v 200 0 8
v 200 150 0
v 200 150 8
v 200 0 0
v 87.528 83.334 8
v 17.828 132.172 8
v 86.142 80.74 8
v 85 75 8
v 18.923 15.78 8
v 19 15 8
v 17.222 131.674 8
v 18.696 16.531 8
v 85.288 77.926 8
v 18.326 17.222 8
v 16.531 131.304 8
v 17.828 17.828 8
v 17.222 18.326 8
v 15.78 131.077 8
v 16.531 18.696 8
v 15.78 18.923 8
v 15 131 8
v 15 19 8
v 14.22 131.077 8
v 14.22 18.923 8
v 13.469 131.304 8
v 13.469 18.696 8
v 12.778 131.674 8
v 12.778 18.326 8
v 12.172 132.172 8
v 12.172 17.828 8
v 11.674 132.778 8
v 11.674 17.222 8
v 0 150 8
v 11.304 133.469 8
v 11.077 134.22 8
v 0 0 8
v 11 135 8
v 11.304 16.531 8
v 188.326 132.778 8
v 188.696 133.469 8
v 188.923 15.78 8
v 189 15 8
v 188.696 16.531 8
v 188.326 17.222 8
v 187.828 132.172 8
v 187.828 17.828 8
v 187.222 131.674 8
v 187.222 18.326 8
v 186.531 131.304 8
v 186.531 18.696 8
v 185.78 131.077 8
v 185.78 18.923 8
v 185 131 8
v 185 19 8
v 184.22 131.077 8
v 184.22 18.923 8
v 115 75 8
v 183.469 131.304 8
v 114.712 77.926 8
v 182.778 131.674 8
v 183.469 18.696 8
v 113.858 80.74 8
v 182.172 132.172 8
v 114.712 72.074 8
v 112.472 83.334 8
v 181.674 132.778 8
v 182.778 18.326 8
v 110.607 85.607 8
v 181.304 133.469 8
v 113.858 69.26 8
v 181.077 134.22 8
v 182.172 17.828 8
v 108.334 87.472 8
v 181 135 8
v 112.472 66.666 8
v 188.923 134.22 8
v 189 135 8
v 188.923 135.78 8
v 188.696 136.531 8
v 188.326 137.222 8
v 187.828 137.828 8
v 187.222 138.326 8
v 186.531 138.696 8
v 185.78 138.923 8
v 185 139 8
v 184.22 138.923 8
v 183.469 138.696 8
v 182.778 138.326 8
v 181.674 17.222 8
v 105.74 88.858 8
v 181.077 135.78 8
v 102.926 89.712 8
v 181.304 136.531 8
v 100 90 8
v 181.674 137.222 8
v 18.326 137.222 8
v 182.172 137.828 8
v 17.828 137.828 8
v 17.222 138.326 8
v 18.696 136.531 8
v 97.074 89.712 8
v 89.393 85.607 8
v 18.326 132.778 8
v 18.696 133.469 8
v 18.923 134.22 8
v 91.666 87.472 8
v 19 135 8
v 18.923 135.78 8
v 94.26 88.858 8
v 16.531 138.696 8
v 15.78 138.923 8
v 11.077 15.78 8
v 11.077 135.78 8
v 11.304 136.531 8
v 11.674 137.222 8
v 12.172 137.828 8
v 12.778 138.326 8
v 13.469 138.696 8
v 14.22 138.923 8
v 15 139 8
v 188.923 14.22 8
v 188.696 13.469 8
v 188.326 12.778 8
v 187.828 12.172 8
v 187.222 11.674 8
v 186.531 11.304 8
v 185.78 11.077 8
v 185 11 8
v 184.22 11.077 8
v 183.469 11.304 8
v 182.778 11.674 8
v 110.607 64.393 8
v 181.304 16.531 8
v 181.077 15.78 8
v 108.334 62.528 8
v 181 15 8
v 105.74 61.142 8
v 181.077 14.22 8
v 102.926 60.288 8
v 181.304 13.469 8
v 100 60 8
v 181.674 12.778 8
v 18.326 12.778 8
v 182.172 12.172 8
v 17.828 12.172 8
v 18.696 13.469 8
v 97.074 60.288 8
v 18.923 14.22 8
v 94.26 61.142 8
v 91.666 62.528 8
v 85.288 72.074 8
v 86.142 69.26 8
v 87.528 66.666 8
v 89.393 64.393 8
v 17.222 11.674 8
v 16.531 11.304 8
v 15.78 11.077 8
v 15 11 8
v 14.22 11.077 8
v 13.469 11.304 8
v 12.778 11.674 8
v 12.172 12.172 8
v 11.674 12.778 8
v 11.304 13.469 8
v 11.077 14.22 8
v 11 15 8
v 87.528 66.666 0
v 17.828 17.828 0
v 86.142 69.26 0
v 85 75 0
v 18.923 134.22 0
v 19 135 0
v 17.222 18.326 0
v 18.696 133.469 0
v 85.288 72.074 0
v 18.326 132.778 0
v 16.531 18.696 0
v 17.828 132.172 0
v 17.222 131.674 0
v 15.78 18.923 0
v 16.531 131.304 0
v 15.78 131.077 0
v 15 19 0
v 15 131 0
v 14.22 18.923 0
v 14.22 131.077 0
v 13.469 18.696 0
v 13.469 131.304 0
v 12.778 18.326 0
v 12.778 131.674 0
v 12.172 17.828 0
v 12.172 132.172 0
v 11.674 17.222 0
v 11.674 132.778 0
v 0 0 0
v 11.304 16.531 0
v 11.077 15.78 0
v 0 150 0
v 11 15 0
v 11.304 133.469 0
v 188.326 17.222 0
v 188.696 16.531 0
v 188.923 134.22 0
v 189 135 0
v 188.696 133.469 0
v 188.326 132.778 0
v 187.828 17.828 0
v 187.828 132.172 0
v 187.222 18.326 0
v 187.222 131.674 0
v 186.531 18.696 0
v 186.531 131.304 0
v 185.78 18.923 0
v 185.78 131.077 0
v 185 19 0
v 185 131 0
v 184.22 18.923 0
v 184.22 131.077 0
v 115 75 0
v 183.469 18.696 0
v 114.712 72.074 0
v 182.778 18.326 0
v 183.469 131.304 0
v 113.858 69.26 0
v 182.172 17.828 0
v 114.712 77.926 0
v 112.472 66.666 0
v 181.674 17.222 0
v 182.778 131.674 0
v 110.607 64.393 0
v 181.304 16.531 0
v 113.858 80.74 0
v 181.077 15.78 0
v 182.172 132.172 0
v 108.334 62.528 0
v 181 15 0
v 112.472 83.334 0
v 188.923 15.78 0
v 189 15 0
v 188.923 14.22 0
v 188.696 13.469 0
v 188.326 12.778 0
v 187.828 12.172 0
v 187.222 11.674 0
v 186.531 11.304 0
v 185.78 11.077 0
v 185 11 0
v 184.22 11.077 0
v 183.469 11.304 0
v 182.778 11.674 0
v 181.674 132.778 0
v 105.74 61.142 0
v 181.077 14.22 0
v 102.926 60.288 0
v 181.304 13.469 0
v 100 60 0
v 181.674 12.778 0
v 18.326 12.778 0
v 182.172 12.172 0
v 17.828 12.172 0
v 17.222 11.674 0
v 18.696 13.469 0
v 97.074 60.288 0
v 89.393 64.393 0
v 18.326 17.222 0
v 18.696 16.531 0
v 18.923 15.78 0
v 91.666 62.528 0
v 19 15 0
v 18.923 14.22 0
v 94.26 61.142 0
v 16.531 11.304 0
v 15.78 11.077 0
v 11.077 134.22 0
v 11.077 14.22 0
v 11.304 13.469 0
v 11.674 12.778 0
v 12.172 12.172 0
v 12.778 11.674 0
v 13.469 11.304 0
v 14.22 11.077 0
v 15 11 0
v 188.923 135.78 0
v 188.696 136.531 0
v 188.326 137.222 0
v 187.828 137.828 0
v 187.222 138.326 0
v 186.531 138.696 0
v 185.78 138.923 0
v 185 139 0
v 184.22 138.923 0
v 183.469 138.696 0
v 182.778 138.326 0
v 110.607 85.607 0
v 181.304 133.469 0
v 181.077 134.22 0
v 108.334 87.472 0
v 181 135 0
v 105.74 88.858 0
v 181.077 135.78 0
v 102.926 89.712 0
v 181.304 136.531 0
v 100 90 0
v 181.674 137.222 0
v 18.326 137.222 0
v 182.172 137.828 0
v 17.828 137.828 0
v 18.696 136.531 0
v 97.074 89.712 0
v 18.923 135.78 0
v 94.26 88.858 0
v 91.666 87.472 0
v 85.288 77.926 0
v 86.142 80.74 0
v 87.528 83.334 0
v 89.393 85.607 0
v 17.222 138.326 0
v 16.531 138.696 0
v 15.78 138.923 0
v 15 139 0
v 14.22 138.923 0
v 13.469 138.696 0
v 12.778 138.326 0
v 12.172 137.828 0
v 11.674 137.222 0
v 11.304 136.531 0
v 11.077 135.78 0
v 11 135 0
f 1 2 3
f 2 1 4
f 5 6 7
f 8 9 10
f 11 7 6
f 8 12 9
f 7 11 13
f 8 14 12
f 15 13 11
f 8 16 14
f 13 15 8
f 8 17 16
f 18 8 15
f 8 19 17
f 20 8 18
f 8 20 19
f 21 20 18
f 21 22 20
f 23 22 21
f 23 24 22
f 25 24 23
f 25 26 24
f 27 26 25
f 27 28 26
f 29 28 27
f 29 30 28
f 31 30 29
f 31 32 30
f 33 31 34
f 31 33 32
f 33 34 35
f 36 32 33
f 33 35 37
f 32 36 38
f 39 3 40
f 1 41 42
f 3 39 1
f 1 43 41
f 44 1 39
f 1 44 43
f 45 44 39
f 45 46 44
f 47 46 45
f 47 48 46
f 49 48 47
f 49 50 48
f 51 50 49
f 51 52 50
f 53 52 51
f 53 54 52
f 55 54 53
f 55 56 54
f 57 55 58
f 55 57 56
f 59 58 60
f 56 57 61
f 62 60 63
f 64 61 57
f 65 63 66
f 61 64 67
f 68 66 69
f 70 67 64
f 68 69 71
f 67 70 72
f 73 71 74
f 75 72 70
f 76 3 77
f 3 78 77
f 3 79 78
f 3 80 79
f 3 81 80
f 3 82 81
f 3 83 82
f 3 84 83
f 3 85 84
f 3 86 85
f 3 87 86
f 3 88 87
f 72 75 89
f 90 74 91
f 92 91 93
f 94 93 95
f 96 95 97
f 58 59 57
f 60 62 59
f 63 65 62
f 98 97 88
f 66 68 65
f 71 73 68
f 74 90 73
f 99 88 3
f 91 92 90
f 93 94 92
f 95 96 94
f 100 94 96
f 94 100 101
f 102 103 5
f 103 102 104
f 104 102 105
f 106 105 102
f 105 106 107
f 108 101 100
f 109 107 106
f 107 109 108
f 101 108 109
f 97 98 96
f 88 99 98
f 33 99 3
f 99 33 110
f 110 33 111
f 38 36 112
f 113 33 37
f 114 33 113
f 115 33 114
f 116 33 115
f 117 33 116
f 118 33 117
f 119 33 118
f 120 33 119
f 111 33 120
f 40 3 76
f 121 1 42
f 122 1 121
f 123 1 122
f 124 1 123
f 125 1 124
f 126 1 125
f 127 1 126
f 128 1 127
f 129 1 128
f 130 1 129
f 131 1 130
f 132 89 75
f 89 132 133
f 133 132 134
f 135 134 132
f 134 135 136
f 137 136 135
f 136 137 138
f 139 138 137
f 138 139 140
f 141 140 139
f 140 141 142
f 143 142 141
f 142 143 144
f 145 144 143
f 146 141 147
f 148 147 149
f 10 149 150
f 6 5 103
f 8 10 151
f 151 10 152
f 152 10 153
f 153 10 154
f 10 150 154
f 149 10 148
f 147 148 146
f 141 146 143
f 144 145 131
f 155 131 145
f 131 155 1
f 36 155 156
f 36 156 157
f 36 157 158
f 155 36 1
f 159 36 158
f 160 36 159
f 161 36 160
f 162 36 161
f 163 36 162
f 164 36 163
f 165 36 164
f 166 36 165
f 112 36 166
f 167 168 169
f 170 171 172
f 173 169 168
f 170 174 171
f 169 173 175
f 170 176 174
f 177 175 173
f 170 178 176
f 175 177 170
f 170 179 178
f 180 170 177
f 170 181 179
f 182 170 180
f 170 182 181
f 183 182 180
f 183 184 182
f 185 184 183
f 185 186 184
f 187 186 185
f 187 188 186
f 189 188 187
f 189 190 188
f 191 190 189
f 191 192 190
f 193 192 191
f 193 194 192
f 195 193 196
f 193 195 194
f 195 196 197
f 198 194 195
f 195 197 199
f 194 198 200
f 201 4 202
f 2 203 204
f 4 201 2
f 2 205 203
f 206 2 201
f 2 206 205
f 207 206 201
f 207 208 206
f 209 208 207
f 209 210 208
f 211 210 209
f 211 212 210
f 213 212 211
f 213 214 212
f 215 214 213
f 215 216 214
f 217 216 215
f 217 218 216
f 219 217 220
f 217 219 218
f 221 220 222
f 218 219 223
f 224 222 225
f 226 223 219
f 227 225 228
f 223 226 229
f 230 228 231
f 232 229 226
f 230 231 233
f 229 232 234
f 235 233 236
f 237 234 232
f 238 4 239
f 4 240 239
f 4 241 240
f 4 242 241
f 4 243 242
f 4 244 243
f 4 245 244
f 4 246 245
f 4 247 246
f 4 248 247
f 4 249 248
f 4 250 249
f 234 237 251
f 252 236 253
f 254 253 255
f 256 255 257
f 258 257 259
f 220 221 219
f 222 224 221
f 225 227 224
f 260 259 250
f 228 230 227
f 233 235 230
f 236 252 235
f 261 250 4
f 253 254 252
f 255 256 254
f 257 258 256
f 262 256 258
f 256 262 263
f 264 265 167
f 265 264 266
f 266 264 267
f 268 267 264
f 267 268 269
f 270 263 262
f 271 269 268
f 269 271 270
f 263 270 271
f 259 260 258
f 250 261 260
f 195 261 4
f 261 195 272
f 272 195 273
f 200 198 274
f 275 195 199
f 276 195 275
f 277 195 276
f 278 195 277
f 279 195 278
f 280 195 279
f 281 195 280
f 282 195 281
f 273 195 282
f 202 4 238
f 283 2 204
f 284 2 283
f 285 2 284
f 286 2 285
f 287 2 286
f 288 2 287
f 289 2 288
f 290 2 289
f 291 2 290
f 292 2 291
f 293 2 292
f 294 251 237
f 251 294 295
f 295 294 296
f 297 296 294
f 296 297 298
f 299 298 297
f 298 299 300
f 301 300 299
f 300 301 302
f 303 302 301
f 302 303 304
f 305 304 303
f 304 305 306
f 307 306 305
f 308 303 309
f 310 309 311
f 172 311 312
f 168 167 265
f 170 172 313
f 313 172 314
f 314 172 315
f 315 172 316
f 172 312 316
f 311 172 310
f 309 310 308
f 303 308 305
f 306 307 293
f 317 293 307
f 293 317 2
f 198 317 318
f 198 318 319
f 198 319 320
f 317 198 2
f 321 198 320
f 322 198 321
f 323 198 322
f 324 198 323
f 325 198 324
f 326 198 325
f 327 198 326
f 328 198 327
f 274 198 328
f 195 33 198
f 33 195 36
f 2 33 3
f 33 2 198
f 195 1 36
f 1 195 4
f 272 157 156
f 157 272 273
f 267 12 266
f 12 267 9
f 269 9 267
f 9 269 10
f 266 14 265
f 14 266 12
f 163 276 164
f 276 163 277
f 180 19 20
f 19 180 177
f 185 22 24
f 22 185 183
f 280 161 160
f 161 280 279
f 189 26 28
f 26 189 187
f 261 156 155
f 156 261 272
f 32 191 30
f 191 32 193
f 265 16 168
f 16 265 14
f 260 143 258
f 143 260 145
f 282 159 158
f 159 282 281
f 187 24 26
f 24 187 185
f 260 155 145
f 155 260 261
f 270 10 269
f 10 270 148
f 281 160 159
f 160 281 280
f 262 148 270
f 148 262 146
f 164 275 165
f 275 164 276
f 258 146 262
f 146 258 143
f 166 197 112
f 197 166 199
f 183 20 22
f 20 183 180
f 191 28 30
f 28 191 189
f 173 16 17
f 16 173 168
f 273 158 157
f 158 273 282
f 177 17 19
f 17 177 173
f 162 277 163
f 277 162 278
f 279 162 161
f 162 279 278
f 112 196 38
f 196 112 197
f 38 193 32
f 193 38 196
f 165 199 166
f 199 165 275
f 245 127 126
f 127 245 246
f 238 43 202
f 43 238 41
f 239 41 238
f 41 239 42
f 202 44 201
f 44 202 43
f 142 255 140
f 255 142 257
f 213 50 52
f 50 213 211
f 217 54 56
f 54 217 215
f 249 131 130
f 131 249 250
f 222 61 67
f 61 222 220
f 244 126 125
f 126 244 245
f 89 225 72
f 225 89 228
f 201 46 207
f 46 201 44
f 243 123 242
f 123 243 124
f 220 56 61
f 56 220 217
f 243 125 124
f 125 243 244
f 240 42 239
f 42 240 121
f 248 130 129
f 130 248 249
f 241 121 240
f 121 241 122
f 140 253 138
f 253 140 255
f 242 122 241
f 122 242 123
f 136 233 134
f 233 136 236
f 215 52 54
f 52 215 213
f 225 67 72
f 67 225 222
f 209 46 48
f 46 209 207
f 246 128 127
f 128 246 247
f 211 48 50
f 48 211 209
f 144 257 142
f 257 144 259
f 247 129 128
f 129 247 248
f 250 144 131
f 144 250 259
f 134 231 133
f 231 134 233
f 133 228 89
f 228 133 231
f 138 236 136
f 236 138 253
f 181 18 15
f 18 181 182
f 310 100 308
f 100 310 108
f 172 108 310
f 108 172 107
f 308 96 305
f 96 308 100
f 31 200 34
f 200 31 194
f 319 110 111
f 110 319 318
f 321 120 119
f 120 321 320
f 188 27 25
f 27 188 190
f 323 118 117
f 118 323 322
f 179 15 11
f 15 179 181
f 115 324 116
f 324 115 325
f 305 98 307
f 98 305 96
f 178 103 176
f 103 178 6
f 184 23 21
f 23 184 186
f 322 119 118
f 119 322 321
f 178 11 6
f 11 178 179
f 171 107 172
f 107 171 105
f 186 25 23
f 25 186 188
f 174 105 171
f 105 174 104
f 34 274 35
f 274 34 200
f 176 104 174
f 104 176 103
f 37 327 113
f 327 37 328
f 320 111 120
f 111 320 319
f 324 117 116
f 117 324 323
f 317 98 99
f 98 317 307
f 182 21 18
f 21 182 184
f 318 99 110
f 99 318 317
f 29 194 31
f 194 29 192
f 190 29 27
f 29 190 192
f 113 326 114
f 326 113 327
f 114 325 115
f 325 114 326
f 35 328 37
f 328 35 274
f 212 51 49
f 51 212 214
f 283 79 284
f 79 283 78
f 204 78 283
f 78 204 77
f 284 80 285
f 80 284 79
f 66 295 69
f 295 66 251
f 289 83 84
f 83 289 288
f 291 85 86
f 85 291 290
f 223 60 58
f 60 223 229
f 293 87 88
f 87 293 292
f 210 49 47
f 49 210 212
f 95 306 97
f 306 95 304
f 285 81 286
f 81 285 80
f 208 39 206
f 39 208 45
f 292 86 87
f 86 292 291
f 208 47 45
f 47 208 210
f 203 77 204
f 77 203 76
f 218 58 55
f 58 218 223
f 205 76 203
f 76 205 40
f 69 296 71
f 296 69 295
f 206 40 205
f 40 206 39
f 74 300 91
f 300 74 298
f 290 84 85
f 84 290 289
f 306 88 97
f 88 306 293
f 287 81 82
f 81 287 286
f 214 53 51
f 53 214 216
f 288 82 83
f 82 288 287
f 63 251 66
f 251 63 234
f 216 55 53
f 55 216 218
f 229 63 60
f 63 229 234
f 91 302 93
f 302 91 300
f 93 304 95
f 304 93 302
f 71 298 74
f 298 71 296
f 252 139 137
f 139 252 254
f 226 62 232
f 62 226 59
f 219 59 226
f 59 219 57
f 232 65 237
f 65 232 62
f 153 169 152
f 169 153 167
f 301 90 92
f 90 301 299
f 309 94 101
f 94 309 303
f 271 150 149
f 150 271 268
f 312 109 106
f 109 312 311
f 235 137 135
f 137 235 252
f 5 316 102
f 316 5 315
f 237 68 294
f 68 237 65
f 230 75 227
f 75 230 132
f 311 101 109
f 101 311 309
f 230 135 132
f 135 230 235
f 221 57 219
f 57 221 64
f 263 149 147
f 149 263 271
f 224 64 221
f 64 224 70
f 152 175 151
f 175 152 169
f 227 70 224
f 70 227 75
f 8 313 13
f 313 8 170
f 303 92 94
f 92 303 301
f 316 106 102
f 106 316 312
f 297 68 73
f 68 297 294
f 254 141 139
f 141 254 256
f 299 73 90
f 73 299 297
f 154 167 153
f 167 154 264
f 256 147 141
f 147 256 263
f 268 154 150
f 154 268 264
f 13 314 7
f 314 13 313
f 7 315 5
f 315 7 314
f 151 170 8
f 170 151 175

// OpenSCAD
$fn = 32;

// ----------------------------------------------------------------------
// Big plate: 200-250 mm adapter plate
// ----------------------------------------------------------------------

// --- parameters (mm) ---
plate_l = 200;            // plate length, X
plate_w = 150;            // plate width, Y
plate_t = 8;              // plate thickness, Z
corner_d = 8;             // corner hole diameter
corner_in = 15;           // corner hole inset from the edges
bore_d = 30;              // central bore

difference() {
  cube([plate_l, plate_w, plate_t]);
  translate([corner_in, corner_in, -1]) cylinder(h = plate_t + 2, d = corner_d);
  translate([plate_l - corner_in, corner_in, -1]) cylinder(h = plate_t + 2, d = corner_d);
  translate([corner_in, plate_w - corner_in, -1]) cylinder(h = plate_t + 2, d = corner_d);
  translate([plate_l - corner_in, plate_w - corner_in, -1]) cylinder(h = plate_t + 2, d = corner_d);
  translate([plate_l / 2, plate_w / 2, -1]) cylinder(h = plate_t + 2, d = bore_d);
}
